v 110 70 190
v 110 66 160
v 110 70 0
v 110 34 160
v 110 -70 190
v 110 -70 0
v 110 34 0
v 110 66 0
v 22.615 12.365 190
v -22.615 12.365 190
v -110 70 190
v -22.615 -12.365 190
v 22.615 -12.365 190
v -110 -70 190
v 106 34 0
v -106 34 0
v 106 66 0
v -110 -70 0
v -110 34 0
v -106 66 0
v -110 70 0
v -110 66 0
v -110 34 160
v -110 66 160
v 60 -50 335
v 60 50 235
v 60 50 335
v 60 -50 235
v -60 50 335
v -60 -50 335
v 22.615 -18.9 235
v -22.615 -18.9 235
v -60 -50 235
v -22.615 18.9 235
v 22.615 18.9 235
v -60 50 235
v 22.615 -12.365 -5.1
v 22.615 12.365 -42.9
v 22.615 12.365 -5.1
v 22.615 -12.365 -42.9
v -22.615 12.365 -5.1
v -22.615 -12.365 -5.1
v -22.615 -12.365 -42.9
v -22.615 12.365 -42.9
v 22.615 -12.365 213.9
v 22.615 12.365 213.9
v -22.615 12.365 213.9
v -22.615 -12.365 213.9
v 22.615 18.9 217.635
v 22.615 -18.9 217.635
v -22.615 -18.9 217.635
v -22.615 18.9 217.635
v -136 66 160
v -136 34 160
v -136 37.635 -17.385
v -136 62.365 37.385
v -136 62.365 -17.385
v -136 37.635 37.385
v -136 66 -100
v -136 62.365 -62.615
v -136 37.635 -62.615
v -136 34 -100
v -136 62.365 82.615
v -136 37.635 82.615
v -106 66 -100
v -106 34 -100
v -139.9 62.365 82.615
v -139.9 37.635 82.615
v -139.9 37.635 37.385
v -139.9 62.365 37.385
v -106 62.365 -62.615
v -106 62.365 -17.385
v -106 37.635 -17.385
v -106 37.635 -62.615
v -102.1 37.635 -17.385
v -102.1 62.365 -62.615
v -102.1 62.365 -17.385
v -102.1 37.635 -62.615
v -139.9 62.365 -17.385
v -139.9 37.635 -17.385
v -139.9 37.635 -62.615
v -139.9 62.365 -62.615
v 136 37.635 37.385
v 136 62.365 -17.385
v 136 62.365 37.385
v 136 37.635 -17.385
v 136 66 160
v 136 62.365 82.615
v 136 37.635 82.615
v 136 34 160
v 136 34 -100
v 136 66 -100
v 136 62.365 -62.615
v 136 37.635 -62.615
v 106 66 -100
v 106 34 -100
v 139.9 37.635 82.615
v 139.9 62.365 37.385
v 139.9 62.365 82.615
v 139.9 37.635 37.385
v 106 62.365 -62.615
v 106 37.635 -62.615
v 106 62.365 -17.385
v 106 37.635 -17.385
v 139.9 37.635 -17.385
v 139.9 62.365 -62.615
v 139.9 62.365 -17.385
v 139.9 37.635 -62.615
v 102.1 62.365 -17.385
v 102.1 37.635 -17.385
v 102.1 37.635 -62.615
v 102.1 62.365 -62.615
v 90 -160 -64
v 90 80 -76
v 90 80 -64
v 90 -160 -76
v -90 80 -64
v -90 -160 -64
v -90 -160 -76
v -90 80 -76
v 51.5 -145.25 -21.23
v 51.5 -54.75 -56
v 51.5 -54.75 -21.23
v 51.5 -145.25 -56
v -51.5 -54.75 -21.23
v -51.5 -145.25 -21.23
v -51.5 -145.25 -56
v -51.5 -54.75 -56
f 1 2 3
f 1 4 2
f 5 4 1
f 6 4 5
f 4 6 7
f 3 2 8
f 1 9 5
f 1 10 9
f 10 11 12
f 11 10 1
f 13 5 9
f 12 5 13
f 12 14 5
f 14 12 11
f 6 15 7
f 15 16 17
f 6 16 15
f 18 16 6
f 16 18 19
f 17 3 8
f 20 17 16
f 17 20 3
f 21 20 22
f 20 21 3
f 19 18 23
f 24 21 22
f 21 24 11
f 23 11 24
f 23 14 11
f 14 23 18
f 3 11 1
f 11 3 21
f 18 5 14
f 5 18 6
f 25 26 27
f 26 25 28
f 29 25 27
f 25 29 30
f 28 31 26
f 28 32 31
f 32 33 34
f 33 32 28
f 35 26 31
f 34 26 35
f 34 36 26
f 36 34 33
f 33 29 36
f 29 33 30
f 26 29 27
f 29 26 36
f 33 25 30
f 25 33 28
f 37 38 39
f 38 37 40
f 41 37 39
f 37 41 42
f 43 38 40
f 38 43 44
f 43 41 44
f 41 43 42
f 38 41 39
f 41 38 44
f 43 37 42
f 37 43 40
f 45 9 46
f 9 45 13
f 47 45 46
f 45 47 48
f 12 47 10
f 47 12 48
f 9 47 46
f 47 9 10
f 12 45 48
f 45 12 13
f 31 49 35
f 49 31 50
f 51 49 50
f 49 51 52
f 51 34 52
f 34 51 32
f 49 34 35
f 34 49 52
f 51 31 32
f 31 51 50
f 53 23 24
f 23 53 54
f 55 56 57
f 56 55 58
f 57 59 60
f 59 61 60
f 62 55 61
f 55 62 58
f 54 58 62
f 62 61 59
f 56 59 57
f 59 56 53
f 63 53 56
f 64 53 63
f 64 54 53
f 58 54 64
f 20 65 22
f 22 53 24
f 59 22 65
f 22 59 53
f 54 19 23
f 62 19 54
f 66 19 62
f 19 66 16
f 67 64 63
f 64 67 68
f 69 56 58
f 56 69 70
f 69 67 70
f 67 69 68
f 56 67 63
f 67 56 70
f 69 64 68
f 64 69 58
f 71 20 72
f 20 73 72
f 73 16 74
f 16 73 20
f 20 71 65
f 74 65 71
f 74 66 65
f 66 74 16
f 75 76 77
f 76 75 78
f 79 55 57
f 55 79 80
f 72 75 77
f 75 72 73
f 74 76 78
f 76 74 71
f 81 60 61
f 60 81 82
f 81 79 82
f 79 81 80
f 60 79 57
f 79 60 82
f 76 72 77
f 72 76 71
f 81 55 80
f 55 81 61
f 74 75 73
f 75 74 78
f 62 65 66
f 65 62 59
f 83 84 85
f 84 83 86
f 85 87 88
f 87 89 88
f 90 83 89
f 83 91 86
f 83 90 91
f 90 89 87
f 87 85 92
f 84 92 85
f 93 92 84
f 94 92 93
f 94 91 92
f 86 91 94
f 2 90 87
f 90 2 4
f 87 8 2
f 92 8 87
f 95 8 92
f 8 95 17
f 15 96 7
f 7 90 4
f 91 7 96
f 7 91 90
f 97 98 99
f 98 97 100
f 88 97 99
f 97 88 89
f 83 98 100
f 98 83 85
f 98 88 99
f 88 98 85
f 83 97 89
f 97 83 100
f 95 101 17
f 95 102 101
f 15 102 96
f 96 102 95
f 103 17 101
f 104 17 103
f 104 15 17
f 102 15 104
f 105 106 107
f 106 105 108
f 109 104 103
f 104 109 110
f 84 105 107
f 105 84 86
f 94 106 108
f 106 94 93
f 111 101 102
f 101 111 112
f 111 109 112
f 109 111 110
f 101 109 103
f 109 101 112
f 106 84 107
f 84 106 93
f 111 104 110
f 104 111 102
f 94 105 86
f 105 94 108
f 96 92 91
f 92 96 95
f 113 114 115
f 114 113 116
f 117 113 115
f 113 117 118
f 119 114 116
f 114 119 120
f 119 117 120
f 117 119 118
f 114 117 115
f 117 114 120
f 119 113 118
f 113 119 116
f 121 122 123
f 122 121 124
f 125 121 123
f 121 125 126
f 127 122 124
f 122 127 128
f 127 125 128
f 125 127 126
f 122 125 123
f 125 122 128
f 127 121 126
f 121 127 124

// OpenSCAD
// PROVISIONAL PACKAGING BLOCKS ONLY. Not printable mounts or a safe assembly.
// Generated by build_layout.py from parameters.json; dimensions mm.
show_references = true;
show_reserved_bay = true;
// future Jetson bay: 
if (show_reserved_bay) color([0.15294117647058825, 0.6470588235294118, 0.5411764705882353, 0.25]) translate([0, 0, 90]) cube([130, 65, 120], center=true);
// torso outer reference: No shell thickness allocated
if (show_references) color([0.5294117647058824, 0.5686274509803921, 0.6078431372549019, 0.13]) translate([0, 0, 95.0]) cube([220, 140, 190], center=true);
// head placeholder: Speaker dimensions unknown; no fit claim
if (show_references) color([0.5294117647058824, 0.5686274509803921, 0.6078431372549019, 0.13]) translate([0, 0, 285]) cube([120, 100, 100], center=true);
// waist servo: 
color([0.3176470588235294, 0.48627450980392156, 0.7294117647058823, 0.85]) translate([0, 0, -24]) cube([45.23, 24.73, 37.8], center=true);
// head yaw servo: 
color([0.3176470588235294, 0.48627450980392156, 0.7294117647058823, 0.85]) translate([0, 0, 195]) cube([45.23, 24.73, 37.8], center=true);
// head pitch servo: 
color([0.3176470588235294, 0.48627450980392156, 0.7294117647058823, 0.85]) translate([0, 0, 230]) cube([45.23, 37.8, 24.73], center=true);
// waist support corridor: 
color([0.6392156862745098, 0.6666666666666666, 0.7019607843137254, 0.85]) translate([0, 0, 10]) cube([60, 60, 20], center=true);
// neck support corridor: 
color([0.6392156862745098, 0.6666666666666666, 0.7019607843137254, 0.85]) translate([0, 0, 165]) cube([60, 60, 20], center=true);
// left proximal shoulder: 
color([0.3176470588235294, 0.48627450980392156, 0.7294117647058823, 0.85]) translate([-83, 0, 160]) cube([24.73, 37.8, 45.23], center=true);
// left distal shoulder: 
color([0.3176470588235294, 0.48627450980392156, 0.7294117647058823, 0.85]) translate([-86, 50, 160]) cube([37.8, 24.73, 45.23], center=true);
// left upper arm reference: No wall thickness, actuator pocket or swept motion model
if (show_references) color([0.5294117647058824, 0.5686274509803921, 0.6078431372549019, 0.13]) translate([-121, 50, 110.0]) cube([30, 32, 100], center=true);
// left elbow: 
color([0.3176470588235294, 0.48627450980392156, 0.7294117647058823, 0.85]) translate([-121, 50, 60]) cube([37.8, 24.73, 45.23], center=true);
// left forearm reference: No wall thickness, actuator pocket or swept motion model
if (show_references) color([0.5294117647058824, 0.5686274509803921, 0.6078431372549019, 0.13]) translate([-121, 50, 10.0]) cube([30, 32, 100], center=true);
// left wrist: 
color([0.3176470588235294, 0.48627450980392156, 0.7294117647058823, 0.85]) translate([-121, 50, -40]) cube([37.8, 24.73, 45.23], center=true);
// left hand reference: No wall thickness, actuator pocket or swept motion model
if (show_references) color([0.5294117647058824, 0.5686274509803921, 0.6078431372549019, 0.13]) translate([-121, 50, -70.0]) cube([30, 32, 60], center=true);
// left rear torso frame corridor: Proposed rear load path; leaves front access to bay; no strength calculation
color([0.6392156862745098, 0.6666666666666666, 0.7019607843137254, 0.85]) translate([-60, -43, 87.5]) cube([10, 10, 135], center=true);
// right proximal shoulder: 
color([0.3176470588235294, 0.48627450980392156, 0.7294117647058823, 0.85]) translate([83, 0, 160]) cube([24.73, 37.8, 45.23], center=true);
// right distal shoulder: 
color([0.3176470588235294, 0.48627450980392156, 0.7294117647058823, 0.85]) translate([86, 50, 160]) cube([37.8, 24.73, 45.23], center=true);
// right upper arm reference: No wall thickness, actuator pocket or swept motion model
if (show_references) color([0.5294117647058824, 0.5686274509803921, 0.6078431372549019, 0.13]) translate([121, 50, 110.0]) cube([30, 32, 100], center=true);
// right elbow: 
color([0.3176470588235294, 0.48627450980392156, 0.7294117647058823, 0.85]) translate([121, 50, 60]) cube([37.8, 24.73, 45.23], center=true);
// right forearm reference: No wall thickness, actuator pocket or swept motion model
if (show_references) color([0.5294117647058824, 0.5686274509803921, 0.6078431372549019, 0.13]) translate([121, 50, 10.0]) cube([30, 32, 100], center=true);
// right wrist: 
color([0.3176470588235294, 0.48627450980392156, 0.7294117647058823, 0.85]) translate([121, 50, -40]) cube([37.8, 24.73, 45.23], center=true);
// right hand reference: No wall thickness, actuator pocket or swept motion model
if (show_references) color([0.5294117647058824, 0.5686274509803921, 0.6078431372549019, 0.13]) translate([121, 50, -70.0]) cube([30, 32, 60], center=true);
// right rear torso frame corridor: Proposed rear load path; leaves front access to bay; no strength calculation
color([0.6392156862745098, 0.6666666666666666, 0.7019607843137254, 0.85]) translate([60, -43, 87.5]) cube([10, 10, 135], center=true);
// stand assembly platform: 
color([0.6392156862745098, 0.6666666666666666, 0.7019607843137254, 0.85]) translate([0, -40, -70]) cube([180, 240, 12], center=true);
// Jetson on stand: 
color([0.8156862745098039, 0.5764705882352941, 0.25098039215686274, 0.85]) translate([0, -100, -38.615]) cube([103, 90.5, 34.77], center=true);
